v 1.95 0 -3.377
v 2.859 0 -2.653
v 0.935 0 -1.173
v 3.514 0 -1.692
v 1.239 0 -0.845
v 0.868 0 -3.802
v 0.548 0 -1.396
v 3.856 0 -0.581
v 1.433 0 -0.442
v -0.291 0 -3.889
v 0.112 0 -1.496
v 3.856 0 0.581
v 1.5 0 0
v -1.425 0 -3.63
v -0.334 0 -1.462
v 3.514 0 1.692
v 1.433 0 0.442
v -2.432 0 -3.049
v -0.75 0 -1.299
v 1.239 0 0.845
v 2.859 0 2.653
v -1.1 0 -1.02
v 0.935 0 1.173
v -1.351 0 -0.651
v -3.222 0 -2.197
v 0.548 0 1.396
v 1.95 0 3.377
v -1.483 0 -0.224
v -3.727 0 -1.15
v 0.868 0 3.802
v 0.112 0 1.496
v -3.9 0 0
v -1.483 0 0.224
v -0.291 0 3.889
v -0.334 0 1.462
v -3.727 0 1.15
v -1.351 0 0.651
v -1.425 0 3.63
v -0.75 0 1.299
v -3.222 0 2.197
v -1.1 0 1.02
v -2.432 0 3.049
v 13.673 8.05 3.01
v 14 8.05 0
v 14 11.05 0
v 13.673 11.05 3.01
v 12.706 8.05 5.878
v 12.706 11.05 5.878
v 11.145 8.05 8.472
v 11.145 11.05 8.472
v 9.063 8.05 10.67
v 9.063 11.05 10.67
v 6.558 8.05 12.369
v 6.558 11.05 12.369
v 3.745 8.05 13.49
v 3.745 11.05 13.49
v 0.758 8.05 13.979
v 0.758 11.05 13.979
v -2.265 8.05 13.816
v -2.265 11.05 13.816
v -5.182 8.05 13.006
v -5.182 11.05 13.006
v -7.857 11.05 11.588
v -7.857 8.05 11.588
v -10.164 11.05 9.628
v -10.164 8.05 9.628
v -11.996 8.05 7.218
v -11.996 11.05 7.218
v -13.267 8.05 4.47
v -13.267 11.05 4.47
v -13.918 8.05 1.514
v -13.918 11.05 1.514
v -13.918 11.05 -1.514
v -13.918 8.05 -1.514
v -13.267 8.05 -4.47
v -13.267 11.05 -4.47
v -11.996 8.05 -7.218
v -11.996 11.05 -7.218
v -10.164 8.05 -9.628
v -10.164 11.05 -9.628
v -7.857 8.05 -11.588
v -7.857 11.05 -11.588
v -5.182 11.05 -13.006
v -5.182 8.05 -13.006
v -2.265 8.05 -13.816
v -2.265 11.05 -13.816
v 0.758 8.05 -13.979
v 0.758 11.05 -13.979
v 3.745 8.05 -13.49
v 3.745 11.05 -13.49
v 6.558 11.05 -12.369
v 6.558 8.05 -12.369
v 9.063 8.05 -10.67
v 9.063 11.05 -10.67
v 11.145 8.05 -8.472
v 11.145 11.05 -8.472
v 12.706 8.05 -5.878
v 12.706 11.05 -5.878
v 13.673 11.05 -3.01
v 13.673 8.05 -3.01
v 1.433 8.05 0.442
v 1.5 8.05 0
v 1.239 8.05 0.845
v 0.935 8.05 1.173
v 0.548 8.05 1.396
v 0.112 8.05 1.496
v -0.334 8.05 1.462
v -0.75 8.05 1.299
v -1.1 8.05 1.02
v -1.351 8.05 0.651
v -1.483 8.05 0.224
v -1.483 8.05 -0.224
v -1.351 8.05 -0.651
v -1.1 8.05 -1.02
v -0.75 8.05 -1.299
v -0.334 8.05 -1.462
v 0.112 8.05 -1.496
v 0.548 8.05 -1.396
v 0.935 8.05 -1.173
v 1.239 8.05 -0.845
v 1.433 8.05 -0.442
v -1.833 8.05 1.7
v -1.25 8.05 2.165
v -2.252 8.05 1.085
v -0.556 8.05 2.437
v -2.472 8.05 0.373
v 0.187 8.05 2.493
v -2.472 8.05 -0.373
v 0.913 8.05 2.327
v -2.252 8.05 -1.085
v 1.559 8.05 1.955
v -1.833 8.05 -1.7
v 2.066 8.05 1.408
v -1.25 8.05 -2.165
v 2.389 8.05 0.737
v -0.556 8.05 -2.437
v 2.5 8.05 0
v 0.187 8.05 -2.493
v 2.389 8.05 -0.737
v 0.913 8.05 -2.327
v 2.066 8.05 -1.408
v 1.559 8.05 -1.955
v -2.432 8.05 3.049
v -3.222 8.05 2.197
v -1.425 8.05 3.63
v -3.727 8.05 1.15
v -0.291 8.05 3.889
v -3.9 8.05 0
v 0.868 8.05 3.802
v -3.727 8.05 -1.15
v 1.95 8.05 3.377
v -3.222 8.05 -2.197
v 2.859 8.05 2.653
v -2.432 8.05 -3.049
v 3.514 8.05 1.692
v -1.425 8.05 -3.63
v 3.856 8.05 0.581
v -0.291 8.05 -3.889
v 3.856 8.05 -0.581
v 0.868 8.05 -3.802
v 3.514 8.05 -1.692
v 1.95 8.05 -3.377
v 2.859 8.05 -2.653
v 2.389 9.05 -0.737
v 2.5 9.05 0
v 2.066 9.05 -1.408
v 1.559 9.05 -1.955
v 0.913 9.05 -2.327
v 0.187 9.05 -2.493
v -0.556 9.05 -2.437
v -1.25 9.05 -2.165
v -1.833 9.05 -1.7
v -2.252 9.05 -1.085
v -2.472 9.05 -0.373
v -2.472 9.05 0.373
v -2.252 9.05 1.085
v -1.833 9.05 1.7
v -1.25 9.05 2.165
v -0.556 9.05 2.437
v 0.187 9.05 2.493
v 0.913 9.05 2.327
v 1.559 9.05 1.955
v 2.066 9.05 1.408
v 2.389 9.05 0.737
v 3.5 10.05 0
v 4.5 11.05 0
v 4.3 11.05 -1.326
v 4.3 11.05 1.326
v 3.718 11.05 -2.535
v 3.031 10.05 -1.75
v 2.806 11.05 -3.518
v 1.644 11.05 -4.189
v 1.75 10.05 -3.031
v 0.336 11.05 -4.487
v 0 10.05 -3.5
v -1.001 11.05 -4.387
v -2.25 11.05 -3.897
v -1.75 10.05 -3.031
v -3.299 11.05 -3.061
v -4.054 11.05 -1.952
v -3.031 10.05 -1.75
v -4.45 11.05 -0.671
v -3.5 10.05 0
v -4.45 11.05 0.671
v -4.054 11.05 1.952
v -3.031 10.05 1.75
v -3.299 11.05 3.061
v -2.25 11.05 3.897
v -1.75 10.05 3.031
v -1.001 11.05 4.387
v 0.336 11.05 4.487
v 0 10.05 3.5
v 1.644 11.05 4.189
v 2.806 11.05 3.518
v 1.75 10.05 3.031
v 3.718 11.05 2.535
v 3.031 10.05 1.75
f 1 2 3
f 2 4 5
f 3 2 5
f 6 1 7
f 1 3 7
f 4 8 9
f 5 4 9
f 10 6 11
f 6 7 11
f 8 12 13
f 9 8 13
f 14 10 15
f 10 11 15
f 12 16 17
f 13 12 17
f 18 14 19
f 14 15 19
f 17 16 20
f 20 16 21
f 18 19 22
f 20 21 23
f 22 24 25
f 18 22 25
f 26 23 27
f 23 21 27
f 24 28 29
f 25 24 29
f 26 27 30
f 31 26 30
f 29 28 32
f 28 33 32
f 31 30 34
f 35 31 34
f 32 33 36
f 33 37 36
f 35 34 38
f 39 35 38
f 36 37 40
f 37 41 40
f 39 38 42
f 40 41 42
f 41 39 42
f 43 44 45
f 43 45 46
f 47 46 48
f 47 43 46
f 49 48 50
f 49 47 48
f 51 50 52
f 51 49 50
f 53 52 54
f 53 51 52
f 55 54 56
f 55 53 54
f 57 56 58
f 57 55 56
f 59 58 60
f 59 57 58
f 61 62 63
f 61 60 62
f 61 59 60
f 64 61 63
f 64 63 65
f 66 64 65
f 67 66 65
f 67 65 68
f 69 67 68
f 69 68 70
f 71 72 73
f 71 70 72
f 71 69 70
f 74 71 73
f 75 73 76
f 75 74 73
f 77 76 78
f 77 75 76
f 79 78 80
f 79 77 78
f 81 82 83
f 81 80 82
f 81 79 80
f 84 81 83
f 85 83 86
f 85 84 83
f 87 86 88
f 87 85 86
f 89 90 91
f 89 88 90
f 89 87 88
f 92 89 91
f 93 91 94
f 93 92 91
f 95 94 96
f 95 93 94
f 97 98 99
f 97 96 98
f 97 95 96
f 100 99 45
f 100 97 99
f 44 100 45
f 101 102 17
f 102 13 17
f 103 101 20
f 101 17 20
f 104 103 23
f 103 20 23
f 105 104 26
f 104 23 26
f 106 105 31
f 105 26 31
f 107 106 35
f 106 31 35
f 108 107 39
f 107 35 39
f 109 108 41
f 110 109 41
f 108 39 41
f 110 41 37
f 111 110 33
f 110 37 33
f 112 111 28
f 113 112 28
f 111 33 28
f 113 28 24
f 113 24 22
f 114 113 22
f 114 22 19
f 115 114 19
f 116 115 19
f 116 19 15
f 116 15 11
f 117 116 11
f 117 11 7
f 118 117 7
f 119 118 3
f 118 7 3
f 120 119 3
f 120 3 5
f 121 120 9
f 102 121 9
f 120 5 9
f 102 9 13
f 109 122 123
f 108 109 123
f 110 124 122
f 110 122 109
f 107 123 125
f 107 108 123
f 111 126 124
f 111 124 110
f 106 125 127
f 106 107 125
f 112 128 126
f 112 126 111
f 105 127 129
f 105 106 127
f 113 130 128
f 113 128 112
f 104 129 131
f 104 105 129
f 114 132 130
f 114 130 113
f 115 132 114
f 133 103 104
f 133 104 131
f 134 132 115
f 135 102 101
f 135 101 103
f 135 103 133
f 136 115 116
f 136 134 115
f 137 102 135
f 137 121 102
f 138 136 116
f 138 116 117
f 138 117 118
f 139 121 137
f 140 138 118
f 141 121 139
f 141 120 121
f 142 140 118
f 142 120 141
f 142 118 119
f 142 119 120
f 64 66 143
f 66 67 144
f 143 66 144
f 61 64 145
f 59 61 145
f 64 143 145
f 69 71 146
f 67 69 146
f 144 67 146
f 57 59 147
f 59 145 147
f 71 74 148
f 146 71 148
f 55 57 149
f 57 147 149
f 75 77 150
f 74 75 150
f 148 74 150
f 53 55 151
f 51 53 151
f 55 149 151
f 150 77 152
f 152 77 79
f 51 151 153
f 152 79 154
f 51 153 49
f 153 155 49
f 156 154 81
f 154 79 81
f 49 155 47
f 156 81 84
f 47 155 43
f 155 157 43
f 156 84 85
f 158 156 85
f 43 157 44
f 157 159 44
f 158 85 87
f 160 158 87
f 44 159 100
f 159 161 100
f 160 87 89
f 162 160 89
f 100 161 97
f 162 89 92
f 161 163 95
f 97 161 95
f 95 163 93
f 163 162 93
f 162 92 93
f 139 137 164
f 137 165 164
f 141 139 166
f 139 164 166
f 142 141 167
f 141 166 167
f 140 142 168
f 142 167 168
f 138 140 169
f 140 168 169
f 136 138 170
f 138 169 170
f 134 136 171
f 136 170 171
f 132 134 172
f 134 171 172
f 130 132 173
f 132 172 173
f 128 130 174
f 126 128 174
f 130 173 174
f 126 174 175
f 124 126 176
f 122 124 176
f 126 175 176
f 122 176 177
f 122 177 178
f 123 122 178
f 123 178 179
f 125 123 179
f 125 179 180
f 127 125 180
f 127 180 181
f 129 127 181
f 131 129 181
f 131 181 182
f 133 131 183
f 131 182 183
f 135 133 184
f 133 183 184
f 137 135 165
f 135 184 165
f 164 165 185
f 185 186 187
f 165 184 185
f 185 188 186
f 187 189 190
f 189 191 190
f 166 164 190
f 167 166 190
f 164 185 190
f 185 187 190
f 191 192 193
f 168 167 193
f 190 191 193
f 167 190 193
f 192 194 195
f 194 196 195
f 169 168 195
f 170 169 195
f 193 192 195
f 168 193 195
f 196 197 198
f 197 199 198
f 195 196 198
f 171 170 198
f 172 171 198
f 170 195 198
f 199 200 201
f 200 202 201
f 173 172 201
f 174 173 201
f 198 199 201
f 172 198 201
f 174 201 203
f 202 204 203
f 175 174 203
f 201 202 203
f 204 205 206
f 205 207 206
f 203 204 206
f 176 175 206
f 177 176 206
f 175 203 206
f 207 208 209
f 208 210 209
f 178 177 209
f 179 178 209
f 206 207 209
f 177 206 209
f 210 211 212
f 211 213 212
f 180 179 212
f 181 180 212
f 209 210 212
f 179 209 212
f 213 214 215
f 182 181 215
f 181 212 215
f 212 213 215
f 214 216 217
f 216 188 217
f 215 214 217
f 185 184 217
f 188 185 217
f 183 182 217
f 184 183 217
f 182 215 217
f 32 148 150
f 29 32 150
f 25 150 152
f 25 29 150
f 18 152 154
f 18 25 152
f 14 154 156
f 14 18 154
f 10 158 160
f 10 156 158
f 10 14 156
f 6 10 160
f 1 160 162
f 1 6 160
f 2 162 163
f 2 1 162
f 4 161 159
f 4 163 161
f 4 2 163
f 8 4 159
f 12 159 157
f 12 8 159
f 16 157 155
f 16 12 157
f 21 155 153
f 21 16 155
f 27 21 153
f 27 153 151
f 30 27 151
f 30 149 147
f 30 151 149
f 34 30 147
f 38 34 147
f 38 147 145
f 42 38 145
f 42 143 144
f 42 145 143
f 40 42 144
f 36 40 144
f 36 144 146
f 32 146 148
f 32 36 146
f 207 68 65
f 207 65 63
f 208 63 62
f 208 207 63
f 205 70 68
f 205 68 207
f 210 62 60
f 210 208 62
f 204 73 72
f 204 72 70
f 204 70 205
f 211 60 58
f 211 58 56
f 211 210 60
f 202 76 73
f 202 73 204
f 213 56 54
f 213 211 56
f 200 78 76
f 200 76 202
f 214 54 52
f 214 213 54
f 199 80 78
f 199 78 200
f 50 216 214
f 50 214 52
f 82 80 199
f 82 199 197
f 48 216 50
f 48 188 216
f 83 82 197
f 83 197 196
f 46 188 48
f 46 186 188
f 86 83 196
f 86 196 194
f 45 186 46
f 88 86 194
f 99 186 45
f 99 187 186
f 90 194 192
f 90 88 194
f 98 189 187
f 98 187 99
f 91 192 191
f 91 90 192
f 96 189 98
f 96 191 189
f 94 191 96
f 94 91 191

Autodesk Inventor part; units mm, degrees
ref_plane "YZ Plane" through (0, 0, 0) normal (1, 0, 0) x (0, 1, 0)
ref_plane "XZ Plane" through (0, 0, 0) normal (0, 1, 0) x (-1, 0, 0)
ref_plane "XY Plane" through (0, 0, 0) normal (0, 0, 1) x (1, 0, 0)
sketch "Эскиз1" plane through (0, 0, 0) normal (0, 1, 0) x (-1, 0, 0)
  circle A0 centre (0, 0) radius 3.9
  dimension "d0" = 7.8
extrude "Выдавливание1" add sketch "Эскиз1" along normal blind 8.05
sketch "Эскиз2" plane through (0, 8.05, 0) normal (0, 1, 0) x (1, 0, 0)
  circle A0 centre (0, 0) radius 1.5
  dimension "d3" = 3
extrude "Выдавливание2" cut sketch "Эскиз2" against normal blind 8.05
sketch "Эскиз3" plane through (0, 8.05, 0) normal (0, 1, 0) x (1, 0, 0)
  circle A0 centre (0, 0) radius 14
  circle A1 centre (0, 0) radius 1.5 projected
  dimension "d6" = 28
extrude "Выдавливание3" add sketch "Эскиз3" along normal blind 3
sketch "Эскиз4" plane through (0, 11.05, 0) normal (0, 1, 0) x (1, 0, 0)
  circle A0 centre (0, 0) radius 2.5
  dimension "d9" = 5
extrude "Выдавливание4" cut sketch "Эскиз4" against normal blind 3
chamfer "Фаска1" distance 2 angle 45 1 edges at (-2.5, 11.05, 0)
properties part number "000.005.002.003 - ВТУЛКА" material "Пластик АБС"
